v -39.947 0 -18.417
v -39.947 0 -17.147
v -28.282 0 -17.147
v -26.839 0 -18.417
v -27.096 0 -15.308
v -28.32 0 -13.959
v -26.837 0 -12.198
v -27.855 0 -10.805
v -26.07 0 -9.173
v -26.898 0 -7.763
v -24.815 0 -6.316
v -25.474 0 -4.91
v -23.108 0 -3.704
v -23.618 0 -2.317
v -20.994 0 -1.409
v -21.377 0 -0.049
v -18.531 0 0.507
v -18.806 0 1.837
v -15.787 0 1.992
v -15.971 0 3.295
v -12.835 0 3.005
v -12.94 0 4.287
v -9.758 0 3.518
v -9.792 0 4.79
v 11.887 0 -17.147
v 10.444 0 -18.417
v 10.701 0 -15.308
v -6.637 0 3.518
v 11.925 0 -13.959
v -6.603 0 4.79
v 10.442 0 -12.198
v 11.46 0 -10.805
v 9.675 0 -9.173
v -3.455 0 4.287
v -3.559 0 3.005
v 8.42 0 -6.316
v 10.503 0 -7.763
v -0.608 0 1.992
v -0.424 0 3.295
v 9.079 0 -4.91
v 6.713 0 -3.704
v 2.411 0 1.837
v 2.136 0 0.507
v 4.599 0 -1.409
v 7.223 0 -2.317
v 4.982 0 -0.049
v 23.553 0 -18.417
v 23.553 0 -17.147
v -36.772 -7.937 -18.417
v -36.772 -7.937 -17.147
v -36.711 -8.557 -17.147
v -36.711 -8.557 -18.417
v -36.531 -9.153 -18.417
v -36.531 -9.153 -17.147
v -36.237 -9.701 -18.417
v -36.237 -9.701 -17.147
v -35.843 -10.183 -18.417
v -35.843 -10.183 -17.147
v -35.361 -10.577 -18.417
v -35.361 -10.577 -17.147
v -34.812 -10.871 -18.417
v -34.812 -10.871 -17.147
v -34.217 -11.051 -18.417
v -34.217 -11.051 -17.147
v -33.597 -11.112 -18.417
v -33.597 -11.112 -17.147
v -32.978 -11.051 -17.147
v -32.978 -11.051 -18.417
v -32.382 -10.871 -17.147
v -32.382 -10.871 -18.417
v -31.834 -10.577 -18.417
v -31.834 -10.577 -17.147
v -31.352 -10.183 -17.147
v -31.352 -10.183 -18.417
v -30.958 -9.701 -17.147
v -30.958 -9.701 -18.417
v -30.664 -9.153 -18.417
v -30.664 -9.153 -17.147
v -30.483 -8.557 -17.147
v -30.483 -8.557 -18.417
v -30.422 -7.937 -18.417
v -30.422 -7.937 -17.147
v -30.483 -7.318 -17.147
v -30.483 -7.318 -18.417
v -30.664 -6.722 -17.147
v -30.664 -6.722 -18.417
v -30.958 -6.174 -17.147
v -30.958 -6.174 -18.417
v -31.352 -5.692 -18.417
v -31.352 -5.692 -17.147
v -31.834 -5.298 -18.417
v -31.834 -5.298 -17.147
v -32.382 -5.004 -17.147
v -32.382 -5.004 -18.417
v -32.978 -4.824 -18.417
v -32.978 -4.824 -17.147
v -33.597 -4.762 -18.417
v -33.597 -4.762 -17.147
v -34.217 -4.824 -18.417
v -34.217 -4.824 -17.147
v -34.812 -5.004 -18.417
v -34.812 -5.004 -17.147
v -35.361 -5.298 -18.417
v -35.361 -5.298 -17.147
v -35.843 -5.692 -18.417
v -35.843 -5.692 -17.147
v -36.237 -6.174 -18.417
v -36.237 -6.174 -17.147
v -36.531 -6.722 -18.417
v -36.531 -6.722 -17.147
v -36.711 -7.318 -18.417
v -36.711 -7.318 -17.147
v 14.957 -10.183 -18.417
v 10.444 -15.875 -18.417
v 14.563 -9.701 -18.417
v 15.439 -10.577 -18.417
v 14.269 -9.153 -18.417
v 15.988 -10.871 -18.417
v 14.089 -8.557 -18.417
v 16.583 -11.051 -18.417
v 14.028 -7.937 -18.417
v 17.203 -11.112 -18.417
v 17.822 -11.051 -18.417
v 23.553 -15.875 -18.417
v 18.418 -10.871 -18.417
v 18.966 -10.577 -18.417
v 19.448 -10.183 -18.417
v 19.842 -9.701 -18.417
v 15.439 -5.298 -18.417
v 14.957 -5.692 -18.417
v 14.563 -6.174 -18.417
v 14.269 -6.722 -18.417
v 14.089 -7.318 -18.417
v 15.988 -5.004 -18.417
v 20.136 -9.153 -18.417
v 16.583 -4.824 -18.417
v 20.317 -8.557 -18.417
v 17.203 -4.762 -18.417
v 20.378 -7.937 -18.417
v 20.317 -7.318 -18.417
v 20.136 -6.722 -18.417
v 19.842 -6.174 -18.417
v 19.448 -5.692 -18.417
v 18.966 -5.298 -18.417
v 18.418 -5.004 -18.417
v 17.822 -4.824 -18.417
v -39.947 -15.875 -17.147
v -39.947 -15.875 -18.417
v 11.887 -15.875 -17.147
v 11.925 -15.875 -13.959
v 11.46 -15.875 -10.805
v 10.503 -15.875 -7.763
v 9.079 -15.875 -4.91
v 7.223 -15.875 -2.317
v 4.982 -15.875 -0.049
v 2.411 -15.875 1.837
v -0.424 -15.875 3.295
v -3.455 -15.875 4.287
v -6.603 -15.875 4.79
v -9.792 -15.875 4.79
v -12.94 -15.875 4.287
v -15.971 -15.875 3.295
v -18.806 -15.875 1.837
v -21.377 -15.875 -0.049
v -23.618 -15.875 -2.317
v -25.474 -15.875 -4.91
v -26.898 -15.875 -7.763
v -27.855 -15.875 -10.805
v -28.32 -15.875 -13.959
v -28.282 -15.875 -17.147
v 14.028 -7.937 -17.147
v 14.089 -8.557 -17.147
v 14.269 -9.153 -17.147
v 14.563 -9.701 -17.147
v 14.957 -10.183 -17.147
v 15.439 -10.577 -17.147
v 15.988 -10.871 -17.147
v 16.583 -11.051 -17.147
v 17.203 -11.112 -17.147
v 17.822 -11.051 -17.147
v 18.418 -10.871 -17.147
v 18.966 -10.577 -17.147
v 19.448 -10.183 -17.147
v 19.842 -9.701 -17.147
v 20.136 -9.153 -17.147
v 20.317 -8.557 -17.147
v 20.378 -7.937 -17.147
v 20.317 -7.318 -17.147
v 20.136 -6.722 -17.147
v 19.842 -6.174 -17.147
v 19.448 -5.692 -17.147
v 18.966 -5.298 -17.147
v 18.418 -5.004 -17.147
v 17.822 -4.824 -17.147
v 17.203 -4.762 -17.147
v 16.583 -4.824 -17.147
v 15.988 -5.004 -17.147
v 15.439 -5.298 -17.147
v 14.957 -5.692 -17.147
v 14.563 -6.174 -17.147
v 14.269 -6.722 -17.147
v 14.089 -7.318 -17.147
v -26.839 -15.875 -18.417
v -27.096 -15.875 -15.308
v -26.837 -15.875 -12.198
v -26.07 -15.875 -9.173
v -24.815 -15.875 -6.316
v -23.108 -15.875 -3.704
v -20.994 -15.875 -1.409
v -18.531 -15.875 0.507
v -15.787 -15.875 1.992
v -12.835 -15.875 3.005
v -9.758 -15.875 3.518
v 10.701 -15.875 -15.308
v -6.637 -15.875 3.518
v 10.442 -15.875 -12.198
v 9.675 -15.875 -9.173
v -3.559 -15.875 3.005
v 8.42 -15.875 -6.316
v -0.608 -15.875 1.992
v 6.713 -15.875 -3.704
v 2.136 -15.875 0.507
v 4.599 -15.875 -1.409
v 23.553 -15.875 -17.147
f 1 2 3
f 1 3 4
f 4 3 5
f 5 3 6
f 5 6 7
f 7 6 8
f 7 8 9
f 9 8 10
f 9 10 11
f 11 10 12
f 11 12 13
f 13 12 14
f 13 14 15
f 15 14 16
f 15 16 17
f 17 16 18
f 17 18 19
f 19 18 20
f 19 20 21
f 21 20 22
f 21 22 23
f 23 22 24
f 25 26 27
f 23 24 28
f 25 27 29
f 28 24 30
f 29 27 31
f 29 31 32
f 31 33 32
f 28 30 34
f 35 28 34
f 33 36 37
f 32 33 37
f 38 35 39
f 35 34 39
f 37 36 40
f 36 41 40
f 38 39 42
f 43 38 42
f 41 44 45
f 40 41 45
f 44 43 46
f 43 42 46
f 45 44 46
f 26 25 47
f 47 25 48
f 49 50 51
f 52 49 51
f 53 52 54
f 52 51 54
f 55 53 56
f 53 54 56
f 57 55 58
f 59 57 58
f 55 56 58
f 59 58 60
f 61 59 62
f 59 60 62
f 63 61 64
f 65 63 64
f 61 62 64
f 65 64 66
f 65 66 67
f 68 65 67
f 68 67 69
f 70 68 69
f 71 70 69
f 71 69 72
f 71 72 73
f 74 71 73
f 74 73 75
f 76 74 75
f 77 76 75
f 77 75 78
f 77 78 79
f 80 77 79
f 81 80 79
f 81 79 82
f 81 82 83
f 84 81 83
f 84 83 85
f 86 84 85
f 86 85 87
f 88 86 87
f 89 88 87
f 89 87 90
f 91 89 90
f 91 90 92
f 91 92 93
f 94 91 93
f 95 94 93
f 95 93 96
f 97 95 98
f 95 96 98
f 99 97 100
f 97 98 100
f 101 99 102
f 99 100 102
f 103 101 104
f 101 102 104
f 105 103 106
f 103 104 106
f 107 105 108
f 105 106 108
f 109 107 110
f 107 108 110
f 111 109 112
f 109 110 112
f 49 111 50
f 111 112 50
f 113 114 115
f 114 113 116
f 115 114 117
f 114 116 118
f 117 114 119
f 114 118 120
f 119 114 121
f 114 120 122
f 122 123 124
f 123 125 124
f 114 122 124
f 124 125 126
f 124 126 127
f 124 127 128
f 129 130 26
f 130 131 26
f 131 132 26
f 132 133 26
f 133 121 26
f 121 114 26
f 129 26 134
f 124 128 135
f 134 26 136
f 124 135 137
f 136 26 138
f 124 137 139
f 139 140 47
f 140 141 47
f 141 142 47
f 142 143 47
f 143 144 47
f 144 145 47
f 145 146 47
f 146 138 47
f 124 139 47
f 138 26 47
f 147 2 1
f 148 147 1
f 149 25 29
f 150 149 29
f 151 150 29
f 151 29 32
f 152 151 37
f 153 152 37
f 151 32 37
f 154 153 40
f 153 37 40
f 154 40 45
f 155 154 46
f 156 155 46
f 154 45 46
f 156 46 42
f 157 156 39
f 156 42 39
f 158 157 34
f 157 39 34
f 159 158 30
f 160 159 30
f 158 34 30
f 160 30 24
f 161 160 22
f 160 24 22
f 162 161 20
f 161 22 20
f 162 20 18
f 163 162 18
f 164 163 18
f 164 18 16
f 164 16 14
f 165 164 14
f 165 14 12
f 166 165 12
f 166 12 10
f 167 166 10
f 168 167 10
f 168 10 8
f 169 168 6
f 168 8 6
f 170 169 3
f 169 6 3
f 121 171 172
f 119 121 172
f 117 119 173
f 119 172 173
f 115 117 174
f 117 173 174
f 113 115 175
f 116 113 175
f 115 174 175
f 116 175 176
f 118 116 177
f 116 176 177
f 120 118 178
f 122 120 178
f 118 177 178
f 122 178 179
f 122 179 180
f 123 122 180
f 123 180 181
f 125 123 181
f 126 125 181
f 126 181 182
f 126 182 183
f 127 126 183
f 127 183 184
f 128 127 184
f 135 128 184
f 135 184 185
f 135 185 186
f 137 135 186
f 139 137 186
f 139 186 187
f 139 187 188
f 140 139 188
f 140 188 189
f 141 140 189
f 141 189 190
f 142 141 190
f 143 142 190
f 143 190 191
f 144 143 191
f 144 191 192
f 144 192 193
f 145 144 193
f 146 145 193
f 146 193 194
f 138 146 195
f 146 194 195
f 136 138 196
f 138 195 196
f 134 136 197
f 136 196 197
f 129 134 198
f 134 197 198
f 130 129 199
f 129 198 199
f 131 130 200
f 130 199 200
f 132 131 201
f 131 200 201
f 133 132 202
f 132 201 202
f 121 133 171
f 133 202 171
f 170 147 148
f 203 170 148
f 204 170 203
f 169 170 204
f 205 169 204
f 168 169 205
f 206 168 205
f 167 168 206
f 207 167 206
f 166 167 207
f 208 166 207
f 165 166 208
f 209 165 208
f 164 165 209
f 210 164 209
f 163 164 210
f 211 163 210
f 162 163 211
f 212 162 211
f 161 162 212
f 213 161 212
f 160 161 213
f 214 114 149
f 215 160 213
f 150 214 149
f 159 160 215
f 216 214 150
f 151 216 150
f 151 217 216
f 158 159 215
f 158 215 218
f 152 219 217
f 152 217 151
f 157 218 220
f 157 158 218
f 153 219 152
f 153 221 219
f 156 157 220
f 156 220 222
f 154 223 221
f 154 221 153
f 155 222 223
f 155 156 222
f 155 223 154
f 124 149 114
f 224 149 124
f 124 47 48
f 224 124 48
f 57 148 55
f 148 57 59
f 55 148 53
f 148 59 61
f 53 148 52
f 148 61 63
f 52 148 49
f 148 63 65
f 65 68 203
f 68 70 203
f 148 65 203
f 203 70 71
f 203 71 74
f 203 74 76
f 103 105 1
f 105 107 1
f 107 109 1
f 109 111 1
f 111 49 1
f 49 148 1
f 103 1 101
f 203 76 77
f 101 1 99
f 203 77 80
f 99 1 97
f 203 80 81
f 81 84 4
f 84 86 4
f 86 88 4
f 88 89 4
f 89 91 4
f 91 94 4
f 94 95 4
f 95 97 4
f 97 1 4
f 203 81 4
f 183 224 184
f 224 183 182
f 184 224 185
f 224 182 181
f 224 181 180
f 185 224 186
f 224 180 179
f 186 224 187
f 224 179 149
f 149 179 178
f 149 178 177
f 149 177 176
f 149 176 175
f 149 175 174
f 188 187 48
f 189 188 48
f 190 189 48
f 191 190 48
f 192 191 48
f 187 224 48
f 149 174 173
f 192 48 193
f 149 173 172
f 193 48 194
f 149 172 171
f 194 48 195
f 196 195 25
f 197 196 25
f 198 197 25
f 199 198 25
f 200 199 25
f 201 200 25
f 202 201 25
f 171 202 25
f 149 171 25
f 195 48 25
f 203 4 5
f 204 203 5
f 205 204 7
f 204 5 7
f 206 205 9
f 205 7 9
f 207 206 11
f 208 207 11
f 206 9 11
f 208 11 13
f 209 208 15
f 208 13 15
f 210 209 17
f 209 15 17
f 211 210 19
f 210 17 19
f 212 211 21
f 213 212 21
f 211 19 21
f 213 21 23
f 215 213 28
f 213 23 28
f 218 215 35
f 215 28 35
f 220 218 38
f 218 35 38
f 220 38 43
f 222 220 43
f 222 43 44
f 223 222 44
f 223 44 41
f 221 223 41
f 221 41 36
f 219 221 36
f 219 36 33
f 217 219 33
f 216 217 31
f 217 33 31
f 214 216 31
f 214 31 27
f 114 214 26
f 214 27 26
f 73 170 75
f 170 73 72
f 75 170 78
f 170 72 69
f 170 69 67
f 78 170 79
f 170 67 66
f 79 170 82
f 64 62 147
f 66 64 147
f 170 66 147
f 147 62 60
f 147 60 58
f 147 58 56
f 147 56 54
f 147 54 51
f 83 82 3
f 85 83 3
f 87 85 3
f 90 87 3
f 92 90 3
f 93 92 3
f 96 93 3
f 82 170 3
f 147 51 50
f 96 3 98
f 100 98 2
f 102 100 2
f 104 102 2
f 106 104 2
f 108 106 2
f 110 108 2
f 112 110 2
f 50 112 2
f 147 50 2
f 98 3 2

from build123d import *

# Parameters (mm, degrees)
F1_DEPTH = 15.875
F3_D     = 6.35


with BuildPart() as f1:
    # F0 (on Front) → F1 (new body)
    with BuildSketch(Plane.XZ):
        with BuildLine():
            Line((-39.947468, -18.41737), (-26.839392, -18.41737))
            ThreePointArc((-26.839392, -18.41737), (-8.197468, 3.58263), (10.444455, -18.41737))
            Line((10.444455, -18.41737), (23.552532, -18.41737))
            Line((23.552532, -18.41737), (23.552532, -17.14737))
            Line((23.552532, -17.14737), (11.887384, -17.14737))
            ThreePointArc((11.887384, -17.14737), (-8.197468, 4.85263), (-28.282321, -17.14737))
            Line((-28.282321, -17.14737), (-39.947468, -17.14737))
            Line((-39.947468, -17.14737), (-39.947468, -18.41737))
        make_face()
    extrude(amount=F1_DEPTH)

    # F3 (through all)
    with Locations(Plane(origin=(0, 0, -18.41737), x_dir=(1, 0, 0), z_dir=(0, 0, -1))):
        with Locations((-33.597468, 7.9375), (17.202532, 7.9375)):
            Hole(F3_D / 2)


solid = f1.part
